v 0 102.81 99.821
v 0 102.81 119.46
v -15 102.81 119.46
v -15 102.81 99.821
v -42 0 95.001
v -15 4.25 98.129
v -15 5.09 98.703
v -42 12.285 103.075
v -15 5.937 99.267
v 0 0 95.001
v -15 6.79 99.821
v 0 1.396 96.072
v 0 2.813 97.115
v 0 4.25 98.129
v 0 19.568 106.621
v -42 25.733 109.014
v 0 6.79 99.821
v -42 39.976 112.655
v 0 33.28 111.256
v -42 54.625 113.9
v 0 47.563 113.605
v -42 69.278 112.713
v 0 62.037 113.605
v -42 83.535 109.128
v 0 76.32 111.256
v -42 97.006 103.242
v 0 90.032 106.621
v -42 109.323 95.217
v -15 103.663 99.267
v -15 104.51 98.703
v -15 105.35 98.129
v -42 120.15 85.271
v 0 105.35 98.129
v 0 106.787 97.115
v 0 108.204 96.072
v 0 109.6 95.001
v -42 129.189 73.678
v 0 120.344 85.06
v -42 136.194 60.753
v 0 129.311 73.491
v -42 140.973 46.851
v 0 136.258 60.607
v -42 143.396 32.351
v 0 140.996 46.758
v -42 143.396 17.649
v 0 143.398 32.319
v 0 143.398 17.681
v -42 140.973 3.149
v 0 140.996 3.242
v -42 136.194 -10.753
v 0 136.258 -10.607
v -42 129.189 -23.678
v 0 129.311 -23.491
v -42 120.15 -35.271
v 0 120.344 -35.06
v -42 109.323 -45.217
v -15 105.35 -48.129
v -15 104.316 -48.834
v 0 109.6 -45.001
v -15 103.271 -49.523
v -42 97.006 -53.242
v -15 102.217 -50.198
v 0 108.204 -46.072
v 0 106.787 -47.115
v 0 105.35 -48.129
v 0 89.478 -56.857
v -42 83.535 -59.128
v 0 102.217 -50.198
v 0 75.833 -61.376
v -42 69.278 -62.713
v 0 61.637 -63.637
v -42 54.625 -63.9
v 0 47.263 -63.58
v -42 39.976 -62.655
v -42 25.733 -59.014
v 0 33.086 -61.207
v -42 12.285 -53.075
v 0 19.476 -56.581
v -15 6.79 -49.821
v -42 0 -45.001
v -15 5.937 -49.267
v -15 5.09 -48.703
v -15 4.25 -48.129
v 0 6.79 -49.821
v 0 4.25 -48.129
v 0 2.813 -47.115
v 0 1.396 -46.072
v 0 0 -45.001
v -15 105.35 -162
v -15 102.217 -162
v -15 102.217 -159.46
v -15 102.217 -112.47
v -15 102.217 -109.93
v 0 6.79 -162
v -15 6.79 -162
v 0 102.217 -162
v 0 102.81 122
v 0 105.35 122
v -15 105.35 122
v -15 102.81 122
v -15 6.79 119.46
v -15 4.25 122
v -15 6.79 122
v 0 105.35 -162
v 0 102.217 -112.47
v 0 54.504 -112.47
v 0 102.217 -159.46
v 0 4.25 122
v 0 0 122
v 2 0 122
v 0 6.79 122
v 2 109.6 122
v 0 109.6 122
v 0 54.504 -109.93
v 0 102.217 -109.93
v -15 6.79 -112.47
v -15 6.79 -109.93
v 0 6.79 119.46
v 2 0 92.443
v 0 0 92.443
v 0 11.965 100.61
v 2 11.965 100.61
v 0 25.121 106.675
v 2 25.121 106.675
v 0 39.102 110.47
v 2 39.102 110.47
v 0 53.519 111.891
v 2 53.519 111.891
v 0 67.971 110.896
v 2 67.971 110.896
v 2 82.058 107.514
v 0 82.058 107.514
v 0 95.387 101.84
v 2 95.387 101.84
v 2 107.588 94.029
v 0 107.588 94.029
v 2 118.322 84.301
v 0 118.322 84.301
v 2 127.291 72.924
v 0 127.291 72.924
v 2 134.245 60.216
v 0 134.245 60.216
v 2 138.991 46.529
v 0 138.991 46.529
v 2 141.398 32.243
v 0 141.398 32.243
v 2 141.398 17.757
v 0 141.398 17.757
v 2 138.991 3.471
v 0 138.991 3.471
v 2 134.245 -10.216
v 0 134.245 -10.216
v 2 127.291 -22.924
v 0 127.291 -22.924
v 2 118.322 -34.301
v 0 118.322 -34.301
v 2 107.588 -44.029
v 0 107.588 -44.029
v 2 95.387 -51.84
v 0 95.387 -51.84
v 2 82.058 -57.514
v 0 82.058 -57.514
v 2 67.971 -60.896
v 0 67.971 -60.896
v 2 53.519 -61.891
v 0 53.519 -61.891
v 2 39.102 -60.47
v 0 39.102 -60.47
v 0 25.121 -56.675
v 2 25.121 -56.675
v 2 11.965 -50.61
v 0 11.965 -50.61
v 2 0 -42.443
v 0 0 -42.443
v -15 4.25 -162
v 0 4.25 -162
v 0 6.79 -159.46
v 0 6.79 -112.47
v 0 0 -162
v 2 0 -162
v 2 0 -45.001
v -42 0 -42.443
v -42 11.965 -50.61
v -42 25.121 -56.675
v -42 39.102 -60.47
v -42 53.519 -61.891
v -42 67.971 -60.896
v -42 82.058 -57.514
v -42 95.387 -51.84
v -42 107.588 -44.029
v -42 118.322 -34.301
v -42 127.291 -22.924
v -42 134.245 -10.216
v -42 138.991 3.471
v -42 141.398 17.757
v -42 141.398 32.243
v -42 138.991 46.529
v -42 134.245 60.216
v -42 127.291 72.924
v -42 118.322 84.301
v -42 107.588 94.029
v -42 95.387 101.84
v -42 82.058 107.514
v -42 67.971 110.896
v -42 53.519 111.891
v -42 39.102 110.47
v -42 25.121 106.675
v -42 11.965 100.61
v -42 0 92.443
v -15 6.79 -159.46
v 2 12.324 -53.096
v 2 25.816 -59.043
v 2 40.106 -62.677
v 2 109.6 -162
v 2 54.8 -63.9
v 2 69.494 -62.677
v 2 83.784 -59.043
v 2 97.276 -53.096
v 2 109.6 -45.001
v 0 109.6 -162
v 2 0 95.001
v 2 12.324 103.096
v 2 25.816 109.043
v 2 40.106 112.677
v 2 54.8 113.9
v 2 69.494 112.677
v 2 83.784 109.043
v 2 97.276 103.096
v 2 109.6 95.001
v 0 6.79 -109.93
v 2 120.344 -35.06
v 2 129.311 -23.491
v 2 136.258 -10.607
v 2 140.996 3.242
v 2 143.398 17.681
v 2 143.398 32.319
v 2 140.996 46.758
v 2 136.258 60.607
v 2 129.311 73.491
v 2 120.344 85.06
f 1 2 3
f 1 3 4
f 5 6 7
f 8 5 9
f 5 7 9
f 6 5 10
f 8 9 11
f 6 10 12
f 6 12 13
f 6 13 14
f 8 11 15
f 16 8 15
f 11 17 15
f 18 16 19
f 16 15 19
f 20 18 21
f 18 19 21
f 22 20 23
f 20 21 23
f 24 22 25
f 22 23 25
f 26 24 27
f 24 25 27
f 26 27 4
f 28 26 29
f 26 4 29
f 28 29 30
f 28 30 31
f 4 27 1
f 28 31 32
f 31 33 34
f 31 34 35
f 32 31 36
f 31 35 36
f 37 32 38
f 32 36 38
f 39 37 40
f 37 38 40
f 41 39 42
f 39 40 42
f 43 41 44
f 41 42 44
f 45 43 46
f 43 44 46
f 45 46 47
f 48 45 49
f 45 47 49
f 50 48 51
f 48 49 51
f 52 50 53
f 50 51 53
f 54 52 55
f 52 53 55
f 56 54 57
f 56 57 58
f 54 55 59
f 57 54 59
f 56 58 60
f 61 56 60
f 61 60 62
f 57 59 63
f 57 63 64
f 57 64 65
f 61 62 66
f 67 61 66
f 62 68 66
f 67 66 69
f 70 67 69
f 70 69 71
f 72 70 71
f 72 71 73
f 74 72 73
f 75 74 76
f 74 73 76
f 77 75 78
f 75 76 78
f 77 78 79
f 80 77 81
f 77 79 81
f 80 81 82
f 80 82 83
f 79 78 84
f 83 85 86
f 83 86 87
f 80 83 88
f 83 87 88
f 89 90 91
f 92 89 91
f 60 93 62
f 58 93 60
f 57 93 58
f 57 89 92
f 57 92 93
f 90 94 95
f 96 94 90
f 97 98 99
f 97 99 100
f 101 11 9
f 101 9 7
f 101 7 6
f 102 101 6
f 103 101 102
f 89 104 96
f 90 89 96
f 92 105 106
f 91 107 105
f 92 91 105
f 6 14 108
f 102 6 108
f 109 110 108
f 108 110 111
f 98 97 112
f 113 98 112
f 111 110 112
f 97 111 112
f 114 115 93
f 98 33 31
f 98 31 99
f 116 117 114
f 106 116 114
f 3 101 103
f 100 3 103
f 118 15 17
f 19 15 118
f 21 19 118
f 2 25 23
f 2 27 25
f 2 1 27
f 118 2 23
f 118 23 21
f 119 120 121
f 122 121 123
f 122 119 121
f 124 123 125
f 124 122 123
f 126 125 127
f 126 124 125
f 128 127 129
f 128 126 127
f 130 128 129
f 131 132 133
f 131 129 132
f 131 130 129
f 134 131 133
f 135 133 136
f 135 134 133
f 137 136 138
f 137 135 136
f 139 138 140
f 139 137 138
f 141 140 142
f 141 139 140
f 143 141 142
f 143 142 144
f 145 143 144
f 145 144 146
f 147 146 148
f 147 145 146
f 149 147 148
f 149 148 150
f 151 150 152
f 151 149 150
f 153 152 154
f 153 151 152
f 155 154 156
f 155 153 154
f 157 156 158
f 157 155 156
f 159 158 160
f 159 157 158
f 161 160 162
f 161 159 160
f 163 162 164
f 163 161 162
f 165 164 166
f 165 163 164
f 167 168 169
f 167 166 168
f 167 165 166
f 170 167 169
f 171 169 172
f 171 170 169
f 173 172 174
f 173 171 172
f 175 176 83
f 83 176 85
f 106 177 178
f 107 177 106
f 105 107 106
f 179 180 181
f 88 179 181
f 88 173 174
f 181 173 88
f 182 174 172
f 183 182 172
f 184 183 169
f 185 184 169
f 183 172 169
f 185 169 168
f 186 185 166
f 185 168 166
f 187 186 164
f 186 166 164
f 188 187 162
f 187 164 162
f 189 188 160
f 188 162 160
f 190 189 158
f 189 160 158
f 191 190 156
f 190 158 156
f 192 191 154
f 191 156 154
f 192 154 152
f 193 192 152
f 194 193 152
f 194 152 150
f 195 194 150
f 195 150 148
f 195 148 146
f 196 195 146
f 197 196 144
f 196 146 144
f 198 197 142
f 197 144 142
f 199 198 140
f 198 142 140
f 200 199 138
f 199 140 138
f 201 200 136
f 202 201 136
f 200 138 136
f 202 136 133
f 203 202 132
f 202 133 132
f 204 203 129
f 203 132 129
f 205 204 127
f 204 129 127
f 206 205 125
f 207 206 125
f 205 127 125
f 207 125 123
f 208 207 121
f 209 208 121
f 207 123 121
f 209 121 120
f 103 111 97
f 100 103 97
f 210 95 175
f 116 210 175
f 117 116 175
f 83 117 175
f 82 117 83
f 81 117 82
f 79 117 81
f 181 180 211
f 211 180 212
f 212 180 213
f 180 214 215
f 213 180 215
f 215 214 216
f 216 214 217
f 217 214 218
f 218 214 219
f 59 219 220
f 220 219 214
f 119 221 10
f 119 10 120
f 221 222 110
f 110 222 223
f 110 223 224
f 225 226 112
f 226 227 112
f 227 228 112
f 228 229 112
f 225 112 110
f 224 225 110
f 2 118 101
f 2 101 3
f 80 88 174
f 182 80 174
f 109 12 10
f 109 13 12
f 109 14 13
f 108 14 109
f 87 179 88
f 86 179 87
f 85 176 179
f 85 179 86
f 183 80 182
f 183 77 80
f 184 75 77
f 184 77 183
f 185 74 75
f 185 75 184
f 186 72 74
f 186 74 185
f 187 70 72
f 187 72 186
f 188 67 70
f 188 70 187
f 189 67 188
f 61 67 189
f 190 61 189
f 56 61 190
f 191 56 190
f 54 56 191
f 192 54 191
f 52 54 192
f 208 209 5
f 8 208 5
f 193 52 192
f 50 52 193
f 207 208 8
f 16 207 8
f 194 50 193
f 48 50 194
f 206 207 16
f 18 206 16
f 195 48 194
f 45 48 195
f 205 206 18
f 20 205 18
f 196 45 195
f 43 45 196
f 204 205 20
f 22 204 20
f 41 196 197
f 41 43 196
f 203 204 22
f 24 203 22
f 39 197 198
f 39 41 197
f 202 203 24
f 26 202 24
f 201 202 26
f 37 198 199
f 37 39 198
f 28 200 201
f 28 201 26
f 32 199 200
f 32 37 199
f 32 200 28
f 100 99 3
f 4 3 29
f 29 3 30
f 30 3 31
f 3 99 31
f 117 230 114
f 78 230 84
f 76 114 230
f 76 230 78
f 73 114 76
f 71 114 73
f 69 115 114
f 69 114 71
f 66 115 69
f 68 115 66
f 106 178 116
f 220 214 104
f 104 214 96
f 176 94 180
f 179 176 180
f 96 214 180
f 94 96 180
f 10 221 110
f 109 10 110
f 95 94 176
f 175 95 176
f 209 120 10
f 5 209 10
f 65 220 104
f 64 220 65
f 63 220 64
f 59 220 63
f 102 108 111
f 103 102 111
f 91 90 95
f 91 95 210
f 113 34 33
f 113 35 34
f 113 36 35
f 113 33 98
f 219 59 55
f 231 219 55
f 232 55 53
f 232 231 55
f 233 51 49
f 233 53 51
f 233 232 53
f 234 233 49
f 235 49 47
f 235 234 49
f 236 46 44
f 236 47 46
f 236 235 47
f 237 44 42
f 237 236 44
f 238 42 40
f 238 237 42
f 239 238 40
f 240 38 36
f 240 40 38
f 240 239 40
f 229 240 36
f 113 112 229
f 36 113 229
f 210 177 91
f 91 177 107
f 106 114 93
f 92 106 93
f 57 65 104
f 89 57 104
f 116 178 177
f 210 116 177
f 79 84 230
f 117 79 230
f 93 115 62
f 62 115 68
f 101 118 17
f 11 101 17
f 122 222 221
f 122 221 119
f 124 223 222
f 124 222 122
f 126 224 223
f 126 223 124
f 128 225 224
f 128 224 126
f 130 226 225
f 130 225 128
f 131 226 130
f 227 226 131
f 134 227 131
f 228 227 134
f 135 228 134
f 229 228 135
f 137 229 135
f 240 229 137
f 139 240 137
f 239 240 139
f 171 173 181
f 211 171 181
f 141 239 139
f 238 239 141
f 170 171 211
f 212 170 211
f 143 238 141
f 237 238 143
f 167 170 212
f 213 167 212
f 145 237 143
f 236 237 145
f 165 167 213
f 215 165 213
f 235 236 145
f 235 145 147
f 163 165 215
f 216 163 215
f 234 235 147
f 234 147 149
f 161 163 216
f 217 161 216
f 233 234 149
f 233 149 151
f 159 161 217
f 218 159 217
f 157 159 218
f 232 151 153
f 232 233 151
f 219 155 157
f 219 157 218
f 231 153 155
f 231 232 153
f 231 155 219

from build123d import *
from build123d.topology import SkipClean

# Parameters (mm, degrees)
BOSS_EXTRUDE1_DEPTH = 42.000000074
BOSS_EXTRUDE2_START = -2.000000064
BOSS_EXTRUDE2_DEPTH = 2.000000064
BOSS_EXTRUDE3_DEPTH = 15
BOSS_EXTRUDE4_DEPTH = 15
BOSS_EXTRUDE5_DEPTH = 15
BOSS_EXTRUDE6_DEPTH = 15
RIB1_START          = -1.27
RIB1_DEPTH          = 2.54
RIB2_START          = -1.27
RIB2_DEPTH          = 2.54
SKETCH9_W           = 2.54
SKETCH9_H           = 95.427471492
BOSS_EXTRUDE7_DEPTH = 15
SKETCH10_W          = 2.54
SKETCH10_H          = 96.020000118
BOSS_EXTRUDE8_DEPTH = 15


# Read off the part's stored shape, not the designer's step: Rib1, Rib2
with BuildPart() as part:
    # Sketch1 → Boss-Extrude1 (new body)
    with BuildSketch(Plane.ZY):
        with BuildLine():
            Line((-45.001214275, 0), (-42.443087035, 0))
            ThreePointArc((-42.443087035, 0), (25, 141.699999936), (92.443087035, 0))
            Line((92.443087035, 0), (95.001214275, 0))
            ThreePointArc((95.001214275, 0), (25, 143.7), (-45.001214275, 0))
        make_face()
    extrude(amount=BOSS_EXTRUDE1_DEPTH)

    # Sketch2 → Boss-Extrude2 (add)
    with SkipClean():  # the faces are left unmerged after this step: merging them gives an invalid solid
        with BuildSketch(Plane.ZY.offset(BOSS_EXTRUDE2_START)):
            with BuildLine():
                Line((-160, 0), (-45.001214275, 0))
                ThreePointArc((-45.001214275, 0), (-63.9, 54.8), (-45.001214275, 109.6))
                Line((-45.001214275, 109.6), (-160, 109.6))
                Line((-160, 109.6), (-162.000000064, 109.6))
                Line((-162.000000064, 109.6), (-162.000000064, 0))
                Line((-162.000000064, 0), (-160, 0))
            make_face()
            with BuildLine():
                ThreePointArc((-45.001214275, 0), (25, 143.7), (95.001214275, 0))
                Line((95.001214275, 0), (92.443087035, 0))
                ThreePointArc((92.443087035, 0), (25, 141.699999936), (-42.443087035, 0))
                Line((-42.443087035, 0), (-45.001214275, 0))
            make_face()
            with BuildLine():
                ThreePointArc((95.001214275, 109.6), (113.9, 54.8), (95.001214275, 0))
                Line((95.001214275, 0), (120, 0))
                Line((120, 0), (122.000000064, 0))
                Line((122.000000064, 0), (122.000000064, 109.6))
                Line((122.000000064, 109.6), (120, 109.6))
                Line((120, 109.6), (95.001214275, 109.6))
            make_face()
        extrude(amount=BOSS_EXTRUDE2_DEPTH)

    # Sketch3 → Boss-Extrude3 (add)
    with SkipClean():  # the faces are left unmerged after this step: merging them gives an invalid solid
        with BuildSketch(Plane.ZY):
            with BuildLine():
                Line((98.129388676, 4.249999882), (122.000000064, 4.249999882))
                Line((122.000000064, 4.249999882), (122.000000064, 6.789999882))
                Line((122.000000064, 6.789999882), (99.821453399, 6.789999882))
                ThreePointArc((99.821453399, 6.789999882), (98.986321828, 5.512738133), (98.129388676, 4.249999882))
            make_face()
        extrude(amount=BOSS_EXTRUDE3_DEPTH)

    # Sketch4 → Boss-Extrude4 (add)
    with SkipClean():  # the faces are left unmerged after this step: merging them gives an invalid solid
        with BuildSketch(Plane.ZY):
            with BuildLine():
                Line((98.129388757, 105.35), (122.000000064, 105.35))
                Line((122.000000064, 105.35), (122.000000064, 102.81))
                Line((122.000000064, 102.81), (99.821453474, 102.81))
                ThreePointArc((99.821453474, 102.81), (98.986321906, 104.087261749), (98.129388757, 105.35))
            make_face()
        extrude(amount=BOSS_EXTRUDE4_DEPTH)

    # Sketch5 → Boss-Extrude5 (add)
    with SkipClean():  # the faces are left unmerged after this step: merging them gives an invalid solid
        with BuildSketch(Plane.ZY):
            with BuildLine():
                Line((-162.000000064, 4.25), (-48.129388757, 4.25))
                ThreePointArc((-48.129388757, 4.25), (-48.986321906, 5.512738251), (-49.821453474, 6.79))
                Line((-49.821453474, 6.79), (-162.000000064, 6.79))
                Line((-162.000000064, 6.79), (-162.000000064, 4.25))
            make_face()
        extrude(amount=BOSS_EXTRUDE5_DEPTH)

    # Sketch6 → Boss-Extrude6 (add)
    with SkipClean():  # the faces are left unmerged after this step: merging them gives an invalid solid
        with BuildSketch(Plane.ZY):
            with BuildLine():
                Line((-162.000000064, 102.217471492), (-50.198360336, 102.217471492))
                ThreePointArc((-50.198360336, 102.217471492), (-49.180411643, 103.794658163), (-48.129388757, 105.35))
                Line((-48.129388757, 105.35), (-162.000000064, 105.35))
                Line((-162.000000064, 105.35), (-162.000000064, 102.217471492))
            make_face()
        extrude(amount=BOSS_EXTRUDE6_DEPTH)

    # Rib1 outline → Rib1 (add)
    with SkipClean():  # the faces are left unmerged after this step: merging them gives an invalid solid
        with BuildSketch(Plane(origin=(0, 0, -111.200000064), x_dir=(-1, 0, 0), z_dir=(0, 0, -1)).offset(RIB1_START)):
            Polygon((15, 6.79), (0, 54.503735746), (0, 6.79), align=None)
        extrude(amount=RIB1_DEPTH)

    # Rib2 outline → Rib2 (add)
    with SkipClean():  # the faces are left unmerged after this step: merging them gives an invalid solid
        with BuildSketch(Plane(origin=(0, 0, -111.200000064), x_dir=(-1, 0, 0), z_dir=(0, 0, -1)).offset(RIB2_START)):
            Polygon((0, 54.503735746), (15, 102.217471492), (0, 102.217471492), align=None)
        extrude(amount=RIB2_DEPTH)

    # Sketch9 → Boss-Extrude7 (add)
    with SkipClean():  # the faces are left unmerged after this step: merging them gives an invalid solid
        with BuildSketch(Plane.ZY):
            with Locations((-160.730000064, 54.503735746)):
                Rectangle(SKETCH9_W, SKETCH9_H)
        extrude(amount=BOSS_EXTRUDE7_DEPTH)

    # Sketch10 → Boss-Extrude8 (add)
    with SkipClean():  # the faces are left unmerged after this step: merging them gives an invalid solid
        with BuildSketch(Plane.ZY):
            with Locations((120.730000064, 54.799999941)):
                Rectangle(SKETCH10_W, SKETCH10_H)
        extrude(amount=BOSS_EXTRUDE8_DEPTH)


solid = part.part
